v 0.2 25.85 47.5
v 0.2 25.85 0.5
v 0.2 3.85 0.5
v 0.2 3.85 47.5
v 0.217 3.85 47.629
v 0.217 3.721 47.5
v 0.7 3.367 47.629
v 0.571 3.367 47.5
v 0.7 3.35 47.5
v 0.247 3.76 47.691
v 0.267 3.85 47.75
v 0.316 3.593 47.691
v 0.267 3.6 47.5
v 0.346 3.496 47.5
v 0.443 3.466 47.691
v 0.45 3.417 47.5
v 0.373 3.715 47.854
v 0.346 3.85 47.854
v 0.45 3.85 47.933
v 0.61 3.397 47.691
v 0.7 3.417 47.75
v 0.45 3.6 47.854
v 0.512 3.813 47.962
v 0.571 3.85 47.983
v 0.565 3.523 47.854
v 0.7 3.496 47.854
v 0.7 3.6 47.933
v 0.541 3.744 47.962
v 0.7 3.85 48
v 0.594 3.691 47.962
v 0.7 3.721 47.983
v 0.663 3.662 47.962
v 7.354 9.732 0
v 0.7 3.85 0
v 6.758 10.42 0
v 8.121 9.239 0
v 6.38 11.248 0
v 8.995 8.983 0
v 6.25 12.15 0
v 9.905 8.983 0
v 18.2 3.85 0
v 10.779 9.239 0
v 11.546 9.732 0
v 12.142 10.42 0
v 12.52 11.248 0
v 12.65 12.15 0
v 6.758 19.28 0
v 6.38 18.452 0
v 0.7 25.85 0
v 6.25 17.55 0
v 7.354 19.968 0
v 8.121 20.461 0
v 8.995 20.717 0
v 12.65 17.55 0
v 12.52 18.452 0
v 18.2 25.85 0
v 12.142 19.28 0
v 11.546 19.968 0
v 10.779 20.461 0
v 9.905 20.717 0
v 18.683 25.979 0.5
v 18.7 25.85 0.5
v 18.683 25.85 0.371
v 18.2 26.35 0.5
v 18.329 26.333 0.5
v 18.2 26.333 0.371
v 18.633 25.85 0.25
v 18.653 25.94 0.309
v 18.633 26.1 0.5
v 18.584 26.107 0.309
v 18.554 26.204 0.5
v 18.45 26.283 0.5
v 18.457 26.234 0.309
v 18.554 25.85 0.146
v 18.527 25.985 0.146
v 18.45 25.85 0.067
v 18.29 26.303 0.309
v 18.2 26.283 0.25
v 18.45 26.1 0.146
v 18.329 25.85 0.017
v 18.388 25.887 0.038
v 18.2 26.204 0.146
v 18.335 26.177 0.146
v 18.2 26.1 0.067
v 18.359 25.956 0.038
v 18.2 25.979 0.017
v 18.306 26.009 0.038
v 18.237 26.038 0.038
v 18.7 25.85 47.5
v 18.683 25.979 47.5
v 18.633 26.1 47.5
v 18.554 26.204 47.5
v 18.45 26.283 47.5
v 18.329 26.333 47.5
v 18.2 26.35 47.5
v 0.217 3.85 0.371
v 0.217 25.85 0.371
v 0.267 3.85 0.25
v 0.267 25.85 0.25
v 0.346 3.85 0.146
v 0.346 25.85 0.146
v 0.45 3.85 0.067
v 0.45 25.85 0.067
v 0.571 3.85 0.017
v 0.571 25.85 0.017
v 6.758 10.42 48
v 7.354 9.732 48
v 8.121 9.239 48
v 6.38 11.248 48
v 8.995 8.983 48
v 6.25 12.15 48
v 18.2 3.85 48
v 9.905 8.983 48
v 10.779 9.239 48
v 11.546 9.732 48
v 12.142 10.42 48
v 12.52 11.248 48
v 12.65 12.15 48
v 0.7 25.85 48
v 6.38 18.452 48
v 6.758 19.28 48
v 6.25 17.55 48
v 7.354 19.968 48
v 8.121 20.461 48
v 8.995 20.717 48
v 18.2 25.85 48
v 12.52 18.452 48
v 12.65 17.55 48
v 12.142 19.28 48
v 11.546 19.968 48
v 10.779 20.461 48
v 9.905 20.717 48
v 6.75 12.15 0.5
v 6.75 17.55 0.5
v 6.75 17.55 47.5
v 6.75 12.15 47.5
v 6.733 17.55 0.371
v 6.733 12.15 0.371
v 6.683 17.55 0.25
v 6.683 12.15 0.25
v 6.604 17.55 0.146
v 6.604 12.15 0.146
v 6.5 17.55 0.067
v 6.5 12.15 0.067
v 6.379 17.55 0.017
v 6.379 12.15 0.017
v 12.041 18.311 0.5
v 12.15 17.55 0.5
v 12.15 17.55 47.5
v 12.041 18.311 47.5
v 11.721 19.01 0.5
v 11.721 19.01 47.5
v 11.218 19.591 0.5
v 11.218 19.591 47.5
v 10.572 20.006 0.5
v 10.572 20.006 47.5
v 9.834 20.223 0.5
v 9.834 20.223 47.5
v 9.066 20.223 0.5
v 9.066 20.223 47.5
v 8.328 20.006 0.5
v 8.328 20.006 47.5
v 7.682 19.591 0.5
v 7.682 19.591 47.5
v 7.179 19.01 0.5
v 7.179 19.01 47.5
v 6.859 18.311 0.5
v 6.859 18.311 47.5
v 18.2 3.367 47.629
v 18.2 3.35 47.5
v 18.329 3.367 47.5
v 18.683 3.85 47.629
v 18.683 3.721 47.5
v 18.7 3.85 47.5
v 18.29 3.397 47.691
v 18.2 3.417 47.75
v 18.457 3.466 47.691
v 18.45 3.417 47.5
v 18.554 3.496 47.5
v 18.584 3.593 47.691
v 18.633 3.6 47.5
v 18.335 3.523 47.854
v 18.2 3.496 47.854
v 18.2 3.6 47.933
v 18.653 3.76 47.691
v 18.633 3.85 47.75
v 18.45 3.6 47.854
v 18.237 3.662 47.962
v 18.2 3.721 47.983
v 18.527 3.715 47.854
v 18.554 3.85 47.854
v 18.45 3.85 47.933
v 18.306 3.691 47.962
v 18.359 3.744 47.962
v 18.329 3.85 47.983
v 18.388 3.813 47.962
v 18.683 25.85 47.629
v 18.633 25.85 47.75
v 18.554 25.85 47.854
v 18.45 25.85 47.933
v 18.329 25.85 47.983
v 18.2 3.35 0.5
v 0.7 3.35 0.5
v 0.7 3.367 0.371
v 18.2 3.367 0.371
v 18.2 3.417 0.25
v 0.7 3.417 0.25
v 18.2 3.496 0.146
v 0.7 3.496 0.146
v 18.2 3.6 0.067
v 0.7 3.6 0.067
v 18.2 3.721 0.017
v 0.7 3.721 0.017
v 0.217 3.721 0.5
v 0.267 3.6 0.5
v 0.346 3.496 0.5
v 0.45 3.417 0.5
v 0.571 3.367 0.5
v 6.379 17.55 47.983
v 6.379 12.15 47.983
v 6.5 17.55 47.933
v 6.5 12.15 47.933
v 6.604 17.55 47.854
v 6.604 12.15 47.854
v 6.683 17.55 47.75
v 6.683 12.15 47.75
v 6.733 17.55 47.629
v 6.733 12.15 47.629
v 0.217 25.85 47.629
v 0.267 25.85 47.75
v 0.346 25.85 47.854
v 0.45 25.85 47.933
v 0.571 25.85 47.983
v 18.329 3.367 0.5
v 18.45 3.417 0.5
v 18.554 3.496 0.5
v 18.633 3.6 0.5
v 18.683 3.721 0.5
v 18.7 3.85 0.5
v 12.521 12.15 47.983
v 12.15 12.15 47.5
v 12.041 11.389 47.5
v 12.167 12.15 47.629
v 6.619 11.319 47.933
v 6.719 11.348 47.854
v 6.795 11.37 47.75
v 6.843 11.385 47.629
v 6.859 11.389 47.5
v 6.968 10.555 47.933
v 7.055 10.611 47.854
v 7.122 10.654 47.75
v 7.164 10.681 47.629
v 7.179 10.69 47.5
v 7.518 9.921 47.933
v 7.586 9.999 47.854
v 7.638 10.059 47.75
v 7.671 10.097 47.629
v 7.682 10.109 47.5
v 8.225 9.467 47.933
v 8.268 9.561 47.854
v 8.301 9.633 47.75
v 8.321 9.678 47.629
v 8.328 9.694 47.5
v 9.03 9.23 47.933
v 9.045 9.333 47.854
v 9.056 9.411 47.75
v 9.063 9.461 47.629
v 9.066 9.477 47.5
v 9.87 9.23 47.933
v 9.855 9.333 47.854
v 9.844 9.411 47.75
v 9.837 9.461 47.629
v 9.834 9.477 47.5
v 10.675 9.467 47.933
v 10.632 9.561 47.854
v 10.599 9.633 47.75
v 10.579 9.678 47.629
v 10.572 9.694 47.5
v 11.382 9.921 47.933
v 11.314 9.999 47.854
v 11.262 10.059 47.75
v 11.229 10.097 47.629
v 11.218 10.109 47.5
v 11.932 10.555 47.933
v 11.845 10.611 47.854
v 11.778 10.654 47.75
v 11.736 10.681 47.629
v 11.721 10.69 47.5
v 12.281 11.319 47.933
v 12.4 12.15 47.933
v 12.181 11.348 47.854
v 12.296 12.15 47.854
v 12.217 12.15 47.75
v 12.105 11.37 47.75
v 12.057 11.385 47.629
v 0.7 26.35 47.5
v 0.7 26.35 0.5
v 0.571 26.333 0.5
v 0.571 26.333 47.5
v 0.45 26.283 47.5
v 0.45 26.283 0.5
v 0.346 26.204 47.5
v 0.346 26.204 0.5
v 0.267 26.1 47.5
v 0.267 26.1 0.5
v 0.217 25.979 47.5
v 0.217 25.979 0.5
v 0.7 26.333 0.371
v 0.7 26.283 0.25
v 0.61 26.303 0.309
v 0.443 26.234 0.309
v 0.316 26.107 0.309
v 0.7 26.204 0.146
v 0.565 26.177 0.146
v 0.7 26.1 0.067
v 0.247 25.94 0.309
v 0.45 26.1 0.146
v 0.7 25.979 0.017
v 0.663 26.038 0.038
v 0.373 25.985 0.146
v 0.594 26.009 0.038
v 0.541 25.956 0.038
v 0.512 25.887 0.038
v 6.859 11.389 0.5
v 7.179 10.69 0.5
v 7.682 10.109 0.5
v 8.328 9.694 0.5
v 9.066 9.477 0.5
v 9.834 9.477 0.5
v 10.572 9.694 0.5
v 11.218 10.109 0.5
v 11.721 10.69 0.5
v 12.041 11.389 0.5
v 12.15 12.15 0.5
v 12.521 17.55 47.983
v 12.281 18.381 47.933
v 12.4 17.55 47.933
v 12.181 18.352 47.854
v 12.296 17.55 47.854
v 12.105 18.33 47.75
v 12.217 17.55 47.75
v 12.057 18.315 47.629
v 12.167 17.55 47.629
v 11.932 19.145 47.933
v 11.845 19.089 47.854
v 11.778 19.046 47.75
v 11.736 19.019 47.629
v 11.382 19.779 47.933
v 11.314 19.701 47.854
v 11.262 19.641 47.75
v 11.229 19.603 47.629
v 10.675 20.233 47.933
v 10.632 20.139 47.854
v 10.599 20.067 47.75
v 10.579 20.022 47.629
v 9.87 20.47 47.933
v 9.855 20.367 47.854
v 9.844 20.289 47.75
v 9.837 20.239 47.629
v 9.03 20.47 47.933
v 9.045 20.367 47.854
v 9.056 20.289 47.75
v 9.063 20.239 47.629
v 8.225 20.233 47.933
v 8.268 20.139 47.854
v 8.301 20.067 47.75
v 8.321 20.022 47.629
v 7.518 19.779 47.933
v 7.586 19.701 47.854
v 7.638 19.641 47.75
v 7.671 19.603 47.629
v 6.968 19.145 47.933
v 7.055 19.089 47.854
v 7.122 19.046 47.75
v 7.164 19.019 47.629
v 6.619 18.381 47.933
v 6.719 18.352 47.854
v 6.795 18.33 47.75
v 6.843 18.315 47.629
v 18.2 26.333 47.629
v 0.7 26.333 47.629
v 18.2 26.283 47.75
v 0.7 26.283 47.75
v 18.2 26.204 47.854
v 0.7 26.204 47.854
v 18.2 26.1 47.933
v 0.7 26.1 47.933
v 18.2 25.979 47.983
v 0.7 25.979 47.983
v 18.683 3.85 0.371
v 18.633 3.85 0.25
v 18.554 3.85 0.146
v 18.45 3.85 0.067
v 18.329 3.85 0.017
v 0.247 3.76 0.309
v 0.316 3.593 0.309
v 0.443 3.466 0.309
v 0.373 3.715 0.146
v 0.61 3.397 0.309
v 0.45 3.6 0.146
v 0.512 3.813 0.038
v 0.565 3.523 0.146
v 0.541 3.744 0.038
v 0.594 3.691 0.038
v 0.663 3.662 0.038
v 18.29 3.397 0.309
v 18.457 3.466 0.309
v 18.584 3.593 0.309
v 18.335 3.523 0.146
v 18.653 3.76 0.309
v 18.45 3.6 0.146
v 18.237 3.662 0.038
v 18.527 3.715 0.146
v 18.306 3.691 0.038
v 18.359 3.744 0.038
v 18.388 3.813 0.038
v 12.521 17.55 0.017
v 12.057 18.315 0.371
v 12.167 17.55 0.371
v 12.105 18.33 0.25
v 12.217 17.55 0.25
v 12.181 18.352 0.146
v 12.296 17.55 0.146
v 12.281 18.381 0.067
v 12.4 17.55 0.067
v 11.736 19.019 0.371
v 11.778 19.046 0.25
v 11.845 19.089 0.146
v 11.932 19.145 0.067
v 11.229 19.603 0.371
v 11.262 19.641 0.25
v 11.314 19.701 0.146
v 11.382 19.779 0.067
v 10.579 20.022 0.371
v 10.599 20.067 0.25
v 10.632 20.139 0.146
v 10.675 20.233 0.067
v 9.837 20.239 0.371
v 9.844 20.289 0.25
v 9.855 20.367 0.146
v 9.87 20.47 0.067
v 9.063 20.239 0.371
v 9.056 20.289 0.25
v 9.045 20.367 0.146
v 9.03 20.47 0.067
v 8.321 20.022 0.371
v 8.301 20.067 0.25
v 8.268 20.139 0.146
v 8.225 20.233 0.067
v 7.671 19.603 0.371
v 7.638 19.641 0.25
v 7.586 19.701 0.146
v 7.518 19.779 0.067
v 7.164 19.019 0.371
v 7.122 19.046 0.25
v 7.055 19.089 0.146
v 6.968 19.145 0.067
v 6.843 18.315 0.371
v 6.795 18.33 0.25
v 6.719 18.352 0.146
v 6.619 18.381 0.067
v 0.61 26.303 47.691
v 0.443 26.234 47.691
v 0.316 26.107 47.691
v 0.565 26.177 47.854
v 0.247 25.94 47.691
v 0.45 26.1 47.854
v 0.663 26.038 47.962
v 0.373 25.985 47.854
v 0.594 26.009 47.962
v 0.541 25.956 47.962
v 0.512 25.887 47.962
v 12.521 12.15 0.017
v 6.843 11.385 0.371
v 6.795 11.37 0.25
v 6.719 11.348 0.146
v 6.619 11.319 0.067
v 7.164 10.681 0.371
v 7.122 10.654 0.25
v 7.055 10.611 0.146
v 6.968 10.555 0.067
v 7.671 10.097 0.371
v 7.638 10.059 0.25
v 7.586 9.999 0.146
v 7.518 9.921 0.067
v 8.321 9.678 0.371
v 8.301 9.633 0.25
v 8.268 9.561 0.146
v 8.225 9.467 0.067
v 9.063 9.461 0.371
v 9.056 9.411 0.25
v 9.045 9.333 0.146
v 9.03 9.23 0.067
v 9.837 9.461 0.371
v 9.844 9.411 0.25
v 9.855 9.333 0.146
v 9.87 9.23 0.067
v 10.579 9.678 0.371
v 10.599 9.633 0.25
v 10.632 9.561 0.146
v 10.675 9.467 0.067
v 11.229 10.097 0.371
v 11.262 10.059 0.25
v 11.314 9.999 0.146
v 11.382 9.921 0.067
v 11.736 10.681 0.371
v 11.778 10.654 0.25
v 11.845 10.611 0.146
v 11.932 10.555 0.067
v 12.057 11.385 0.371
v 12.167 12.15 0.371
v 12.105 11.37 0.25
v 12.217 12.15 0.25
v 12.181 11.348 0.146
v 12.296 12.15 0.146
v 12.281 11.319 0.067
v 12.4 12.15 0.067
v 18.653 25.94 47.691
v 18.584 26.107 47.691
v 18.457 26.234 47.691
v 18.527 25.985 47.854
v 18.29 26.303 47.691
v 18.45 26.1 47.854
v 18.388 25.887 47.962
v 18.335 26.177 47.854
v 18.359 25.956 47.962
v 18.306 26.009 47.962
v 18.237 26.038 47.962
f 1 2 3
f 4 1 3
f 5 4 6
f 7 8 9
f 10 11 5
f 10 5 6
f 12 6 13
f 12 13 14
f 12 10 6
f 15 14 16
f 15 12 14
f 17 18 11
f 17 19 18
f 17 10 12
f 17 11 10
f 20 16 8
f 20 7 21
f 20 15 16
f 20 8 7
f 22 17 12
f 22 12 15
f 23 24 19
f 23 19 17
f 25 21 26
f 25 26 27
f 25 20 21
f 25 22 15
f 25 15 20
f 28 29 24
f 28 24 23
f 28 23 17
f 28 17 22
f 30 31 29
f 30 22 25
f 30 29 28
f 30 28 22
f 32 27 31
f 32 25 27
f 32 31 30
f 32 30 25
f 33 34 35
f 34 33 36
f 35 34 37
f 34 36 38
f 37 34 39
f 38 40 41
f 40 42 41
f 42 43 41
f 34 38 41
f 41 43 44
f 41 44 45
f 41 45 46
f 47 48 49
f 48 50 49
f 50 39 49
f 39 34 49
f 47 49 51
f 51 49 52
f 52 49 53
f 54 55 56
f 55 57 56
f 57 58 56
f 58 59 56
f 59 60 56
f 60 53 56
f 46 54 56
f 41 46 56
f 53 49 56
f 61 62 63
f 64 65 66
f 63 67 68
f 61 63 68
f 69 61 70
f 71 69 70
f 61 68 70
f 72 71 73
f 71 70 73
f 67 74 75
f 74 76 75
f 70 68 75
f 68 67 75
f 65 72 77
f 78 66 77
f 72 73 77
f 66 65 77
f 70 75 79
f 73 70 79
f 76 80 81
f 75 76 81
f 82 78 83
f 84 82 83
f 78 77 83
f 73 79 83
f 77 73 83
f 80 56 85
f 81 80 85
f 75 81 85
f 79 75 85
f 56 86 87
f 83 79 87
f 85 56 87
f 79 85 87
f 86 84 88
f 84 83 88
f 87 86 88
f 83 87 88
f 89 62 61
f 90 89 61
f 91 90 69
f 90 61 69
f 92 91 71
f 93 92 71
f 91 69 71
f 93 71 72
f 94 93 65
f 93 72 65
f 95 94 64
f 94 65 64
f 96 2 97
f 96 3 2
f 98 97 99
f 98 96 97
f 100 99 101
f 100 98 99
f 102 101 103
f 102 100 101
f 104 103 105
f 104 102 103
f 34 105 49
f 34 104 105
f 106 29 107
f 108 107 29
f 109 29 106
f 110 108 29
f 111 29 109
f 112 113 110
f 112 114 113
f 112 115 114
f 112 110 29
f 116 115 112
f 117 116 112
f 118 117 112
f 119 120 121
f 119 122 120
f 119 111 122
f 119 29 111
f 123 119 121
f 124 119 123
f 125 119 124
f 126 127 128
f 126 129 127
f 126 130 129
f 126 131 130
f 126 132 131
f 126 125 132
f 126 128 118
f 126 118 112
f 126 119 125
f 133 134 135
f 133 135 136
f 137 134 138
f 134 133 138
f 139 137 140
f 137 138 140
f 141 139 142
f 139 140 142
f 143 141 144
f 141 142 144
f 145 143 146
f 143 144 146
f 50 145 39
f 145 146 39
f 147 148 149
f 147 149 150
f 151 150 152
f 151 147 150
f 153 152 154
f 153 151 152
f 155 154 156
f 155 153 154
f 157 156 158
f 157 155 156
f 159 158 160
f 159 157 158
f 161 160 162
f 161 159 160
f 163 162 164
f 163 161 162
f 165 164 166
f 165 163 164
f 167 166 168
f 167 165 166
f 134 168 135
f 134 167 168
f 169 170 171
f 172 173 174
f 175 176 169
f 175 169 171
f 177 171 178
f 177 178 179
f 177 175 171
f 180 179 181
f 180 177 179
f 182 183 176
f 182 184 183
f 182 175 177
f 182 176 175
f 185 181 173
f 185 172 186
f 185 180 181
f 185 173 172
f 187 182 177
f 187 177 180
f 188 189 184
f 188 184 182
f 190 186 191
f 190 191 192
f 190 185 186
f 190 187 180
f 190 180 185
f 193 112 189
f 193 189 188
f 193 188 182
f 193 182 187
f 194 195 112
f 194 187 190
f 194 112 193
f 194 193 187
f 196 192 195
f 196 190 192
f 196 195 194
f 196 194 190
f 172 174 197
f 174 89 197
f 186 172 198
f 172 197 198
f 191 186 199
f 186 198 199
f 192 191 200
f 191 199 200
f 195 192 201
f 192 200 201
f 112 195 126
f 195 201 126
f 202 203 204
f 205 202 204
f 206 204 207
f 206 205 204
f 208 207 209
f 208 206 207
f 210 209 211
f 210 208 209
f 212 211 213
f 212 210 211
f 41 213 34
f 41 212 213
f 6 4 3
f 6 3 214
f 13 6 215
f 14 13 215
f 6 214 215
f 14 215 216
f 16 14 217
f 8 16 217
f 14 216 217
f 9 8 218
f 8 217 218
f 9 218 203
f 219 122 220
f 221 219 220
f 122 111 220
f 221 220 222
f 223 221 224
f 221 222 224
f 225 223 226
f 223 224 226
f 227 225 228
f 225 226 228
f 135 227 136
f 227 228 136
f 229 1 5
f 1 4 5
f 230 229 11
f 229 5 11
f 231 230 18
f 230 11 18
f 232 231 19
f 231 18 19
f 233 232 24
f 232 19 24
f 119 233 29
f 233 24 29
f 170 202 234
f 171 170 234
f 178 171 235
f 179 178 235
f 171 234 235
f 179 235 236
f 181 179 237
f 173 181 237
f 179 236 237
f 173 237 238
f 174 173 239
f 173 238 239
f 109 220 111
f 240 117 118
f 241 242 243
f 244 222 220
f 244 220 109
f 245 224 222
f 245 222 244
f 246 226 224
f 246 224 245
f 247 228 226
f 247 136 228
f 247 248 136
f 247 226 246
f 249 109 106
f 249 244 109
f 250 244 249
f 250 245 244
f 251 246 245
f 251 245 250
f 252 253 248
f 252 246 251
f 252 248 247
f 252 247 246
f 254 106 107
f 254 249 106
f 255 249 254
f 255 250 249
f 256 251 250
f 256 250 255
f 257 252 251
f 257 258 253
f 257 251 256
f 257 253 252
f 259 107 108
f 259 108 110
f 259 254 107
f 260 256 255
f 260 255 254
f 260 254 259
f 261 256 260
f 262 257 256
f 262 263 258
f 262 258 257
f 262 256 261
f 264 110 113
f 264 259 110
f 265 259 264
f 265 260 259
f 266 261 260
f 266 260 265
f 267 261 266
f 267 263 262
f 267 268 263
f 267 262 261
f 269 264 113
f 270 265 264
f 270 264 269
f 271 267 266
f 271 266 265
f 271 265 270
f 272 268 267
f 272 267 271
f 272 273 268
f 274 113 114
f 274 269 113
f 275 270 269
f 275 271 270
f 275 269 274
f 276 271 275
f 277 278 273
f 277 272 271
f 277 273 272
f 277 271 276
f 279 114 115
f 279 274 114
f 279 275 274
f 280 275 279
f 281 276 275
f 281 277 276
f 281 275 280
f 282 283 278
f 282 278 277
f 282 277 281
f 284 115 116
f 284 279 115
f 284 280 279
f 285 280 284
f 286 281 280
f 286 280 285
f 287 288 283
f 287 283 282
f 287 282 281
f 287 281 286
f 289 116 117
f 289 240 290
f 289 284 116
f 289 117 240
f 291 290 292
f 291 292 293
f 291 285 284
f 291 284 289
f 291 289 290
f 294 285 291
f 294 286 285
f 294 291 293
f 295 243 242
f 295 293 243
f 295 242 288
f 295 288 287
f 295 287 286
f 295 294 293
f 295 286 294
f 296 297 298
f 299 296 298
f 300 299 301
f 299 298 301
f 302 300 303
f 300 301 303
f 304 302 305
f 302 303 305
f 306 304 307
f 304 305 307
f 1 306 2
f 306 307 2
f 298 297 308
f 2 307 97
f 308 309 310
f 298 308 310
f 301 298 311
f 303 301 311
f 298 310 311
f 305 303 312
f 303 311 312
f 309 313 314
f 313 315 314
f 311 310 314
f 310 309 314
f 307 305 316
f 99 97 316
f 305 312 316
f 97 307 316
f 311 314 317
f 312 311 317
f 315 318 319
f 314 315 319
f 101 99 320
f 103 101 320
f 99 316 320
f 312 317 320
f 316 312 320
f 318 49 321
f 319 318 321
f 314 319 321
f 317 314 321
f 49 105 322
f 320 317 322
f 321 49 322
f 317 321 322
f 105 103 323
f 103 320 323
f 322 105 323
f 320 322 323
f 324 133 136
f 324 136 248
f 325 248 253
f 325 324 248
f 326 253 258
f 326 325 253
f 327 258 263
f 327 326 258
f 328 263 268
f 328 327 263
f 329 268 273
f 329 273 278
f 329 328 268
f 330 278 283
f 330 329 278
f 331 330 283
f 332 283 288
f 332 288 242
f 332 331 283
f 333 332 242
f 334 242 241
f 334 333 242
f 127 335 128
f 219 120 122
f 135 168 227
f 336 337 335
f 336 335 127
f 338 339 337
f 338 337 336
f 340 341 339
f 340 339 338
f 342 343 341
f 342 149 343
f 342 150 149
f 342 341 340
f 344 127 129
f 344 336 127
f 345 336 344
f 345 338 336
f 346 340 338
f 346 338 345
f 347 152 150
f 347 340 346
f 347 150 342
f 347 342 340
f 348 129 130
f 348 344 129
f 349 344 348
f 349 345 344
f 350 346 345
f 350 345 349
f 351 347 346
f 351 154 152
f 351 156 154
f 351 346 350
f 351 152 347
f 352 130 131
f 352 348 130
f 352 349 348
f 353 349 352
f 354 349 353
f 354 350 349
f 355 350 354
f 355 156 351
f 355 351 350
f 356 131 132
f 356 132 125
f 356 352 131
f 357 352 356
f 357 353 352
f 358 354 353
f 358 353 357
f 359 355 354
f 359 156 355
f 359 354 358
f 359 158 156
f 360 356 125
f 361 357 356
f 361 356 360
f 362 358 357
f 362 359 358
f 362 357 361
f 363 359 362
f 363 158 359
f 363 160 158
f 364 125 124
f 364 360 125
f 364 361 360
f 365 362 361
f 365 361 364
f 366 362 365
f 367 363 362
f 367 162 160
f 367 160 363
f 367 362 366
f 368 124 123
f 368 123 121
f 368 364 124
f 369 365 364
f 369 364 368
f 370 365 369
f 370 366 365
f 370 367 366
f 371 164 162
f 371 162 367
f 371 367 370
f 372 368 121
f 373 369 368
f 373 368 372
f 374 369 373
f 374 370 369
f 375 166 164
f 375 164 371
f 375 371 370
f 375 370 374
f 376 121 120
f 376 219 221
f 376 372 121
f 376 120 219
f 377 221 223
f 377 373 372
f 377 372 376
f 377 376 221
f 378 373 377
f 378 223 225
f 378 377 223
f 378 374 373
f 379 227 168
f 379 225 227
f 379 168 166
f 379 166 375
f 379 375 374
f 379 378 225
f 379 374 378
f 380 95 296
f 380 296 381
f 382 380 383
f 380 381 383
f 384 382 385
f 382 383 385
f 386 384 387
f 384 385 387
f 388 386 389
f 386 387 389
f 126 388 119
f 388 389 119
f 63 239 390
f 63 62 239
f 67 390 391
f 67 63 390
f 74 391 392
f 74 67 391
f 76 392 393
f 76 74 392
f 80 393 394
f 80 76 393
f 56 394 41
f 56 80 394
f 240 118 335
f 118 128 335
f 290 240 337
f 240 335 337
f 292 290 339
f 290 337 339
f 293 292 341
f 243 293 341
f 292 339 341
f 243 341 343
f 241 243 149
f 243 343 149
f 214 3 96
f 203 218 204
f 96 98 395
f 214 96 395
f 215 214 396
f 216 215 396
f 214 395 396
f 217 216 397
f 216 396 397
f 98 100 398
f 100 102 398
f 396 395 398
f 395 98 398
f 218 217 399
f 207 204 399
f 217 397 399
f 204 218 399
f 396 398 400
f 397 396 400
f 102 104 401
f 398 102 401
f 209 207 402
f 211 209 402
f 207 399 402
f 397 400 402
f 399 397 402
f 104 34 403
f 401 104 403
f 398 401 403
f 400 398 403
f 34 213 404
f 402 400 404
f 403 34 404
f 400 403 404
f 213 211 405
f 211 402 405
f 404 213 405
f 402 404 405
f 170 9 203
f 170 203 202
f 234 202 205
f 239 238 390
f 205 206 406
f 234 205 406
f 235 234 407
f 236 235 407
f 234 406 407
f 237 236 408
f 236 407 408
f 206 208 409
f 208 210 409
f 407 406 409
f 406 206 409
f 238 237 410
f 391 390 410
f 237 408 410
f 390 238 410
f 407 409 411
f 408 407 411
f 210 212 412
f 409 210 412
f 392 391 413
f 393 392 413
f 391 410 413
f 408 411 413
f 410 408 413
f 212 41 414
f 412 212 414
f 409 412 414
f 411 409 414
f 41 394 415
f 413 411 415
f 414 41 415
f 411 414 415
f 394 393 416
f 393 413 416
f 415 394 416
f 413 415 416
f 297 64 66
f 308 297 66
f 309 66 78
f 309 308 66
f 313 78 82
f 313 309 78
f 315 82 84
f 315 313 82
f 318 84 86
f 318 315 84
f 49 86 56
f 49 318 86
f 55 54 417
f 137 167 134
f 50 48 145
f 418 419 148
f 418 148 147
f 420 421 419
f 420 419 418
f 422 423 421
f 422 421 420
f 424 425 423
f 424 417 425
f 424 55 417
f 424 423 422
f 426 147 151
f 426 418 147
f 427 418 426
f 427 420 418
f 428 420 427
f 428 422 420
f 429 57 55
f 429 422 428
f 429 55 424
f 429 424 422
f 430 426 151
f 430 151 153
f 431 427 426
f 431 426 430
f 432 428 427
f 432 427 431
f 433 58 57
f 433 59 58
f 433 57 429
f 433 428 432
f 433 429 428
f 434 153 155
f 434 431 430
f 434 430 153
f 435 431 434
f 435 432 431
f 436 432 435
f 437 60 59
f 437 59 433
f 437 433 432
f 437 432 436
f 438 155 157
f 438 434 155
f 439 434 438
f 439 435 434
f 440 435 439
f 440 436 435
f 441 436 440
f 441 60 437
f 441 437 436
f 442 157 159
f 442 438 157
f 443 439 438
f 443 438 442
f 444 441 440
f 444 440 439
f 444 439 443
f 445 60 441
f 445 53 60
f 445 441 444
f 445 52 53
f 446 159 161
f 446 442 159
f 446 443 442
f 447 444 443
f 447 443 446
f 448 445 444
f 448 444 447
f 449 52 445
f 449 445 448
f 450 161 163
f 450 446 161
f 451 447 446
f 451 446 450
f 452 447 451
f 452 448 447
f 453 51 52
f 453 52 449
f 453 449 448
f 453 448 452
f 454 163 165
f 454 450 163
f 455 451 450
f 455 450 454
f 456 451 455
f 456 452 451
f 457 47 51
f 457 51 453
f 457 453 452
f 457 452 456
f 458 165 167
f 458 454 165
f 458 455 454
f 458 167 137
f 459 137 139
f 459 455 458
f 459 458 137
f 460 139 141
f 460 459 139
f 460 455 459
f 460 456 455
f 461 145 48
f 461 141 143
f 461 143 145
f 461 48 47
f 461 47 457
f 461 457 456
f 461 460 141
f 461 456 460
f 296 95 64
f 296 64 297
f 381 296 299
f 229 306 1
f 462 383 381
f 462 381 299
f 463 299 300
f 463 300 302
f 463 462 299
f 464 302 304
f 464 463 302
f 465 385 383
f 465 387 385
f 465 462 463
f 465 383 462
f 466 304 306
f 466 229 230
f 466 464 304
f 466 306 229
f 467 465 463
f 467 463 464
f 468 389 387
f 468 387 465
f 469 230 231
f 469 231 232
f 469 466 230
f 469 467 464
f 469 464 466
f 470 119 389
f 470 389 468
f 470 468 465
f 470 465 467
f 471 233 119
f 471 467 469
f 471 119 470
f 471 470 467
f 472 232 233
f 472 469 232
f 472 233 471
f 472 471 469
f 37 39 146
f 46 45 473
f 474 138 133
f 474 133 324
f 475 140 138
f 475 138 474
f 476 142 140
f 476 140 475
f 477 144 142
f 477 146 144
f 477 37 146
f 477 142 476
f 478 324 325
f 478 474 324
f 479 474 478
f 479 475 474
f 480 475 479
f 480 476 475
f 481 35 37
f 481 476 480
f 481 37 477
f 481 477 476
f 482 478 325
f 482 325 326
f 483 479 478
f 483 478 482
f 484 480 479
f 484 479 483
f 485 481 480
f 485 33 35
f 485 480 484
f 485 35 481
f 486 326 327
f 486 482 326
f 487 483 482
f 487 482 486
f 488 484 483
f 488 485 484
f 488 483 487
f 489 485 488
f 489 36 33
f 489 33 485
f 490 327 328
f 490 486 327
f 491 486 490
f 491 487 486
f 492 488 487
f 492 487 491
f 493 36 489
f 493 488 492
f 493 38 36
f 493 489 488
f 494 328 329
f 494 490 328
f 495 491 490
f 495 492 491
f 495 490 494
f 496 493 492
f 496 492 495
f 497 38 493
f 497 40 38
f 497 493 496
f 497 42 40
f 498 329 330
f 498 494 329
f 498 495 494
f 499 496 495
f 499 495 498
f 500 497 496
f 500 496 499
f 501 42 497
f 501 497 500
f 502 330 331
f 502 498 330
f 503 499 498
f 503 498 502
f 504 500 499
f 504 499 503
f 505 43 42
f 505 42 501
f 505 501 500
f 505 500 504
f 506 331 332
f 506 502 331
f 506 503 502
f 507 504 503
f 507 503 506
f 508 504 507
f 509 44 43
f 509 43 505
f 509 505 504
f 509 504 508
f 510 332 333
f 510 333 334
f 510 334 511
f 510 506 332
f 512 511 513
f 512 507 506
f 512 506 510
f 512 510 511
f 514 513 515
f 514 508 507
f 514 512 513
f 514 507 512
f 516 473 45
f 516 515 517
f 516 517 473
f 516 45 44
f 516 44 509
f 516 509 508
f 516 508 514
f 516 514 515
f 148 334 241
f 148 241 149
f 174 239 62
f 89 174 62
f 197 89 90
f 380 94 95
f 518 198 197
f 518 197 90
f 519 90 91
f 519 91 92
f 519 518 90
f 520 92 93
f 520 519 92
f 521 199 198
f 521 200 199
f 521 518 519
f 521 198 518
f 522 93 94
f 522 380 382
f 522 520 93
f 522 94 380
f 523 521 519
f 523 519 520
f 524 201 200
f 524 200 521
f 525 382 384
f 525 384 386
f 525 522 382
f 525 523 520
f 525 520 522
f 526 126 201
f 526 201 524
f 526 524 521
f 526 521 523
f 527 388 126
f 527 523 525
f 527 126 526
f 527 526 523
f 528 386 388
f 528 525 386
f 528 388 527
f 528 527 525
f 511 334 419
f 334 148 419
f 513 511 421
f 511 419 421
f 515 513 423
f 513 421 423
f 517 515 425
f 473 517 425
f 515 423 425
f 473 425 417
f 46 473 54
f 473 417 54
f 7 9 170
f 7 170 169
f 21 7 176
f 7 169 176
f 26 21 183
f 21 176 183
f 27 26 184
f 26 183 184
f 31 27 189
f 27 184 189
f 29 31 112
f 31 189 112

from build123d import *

# Parameters (mm, degrees)
EXTRUDE_1_DEPTH = 48
FILLET_1_R      = 0.5
FILLET_2_R      = 0.5


with BuildPart() as part:
    # Эскиз1 → Бобышка-Вытянуть1 (new body)
    with BuildSketch(Plane.XY):
        with BuildLine():
            Line((0.7, 3.35), (18.2, 3.35))
            ThreePointArc((18.2, 3.35), (18.553553391, 3.496446609), (18.7, 3.85))
            Line((18.7, 3.85), (18.7, 25.85))
            ThreePointArc((18.7, 25.85), (18.553553391, 26.203553391), (18.2, 26.35))
            Line((18.2, 26.35), (0.7, 26.35))
            ThreePointArc((0.7, 26.35), (0.346446609, 26.203553391), (0.2, 25.85))
            Line((0.2, 25.85), (0.2, 3.85))
            ThreePointArc((0.2, 3.85), (0.346446609, 3.496446609), (0.7, 3.35))
        make_face()
        with BuildLine():
            Line((6.75, 17.55), (6.75, 12.15))
            ThreePointArc((6.75, 12.15), (9.45, 9.45), (12.15, 12.15))
            Line((12.15, 12.15), (12.15, 17.55))
            ThreePointArc((12.15, 17.55), (9.45, 20.25), (6.75, 17.55))
        make_face(mode=Mode.SUBTRACT)
    extrude(amount=EXTRUDE_1_DEPTH)

    # Скругление1
    fillet_1_edges = [part.edges().sort_by_distance(p)[0] for p in [
        (9.45, 3.35, 0),
        (0.346446609, 3.496446609, 0),
        (0.2, 14.85, 0),
        (0.346446609, 26.203553391, 0),
        (9.45, 20.25, 0),
        (6.75, 14.85, 0),
        (9.45, 9.45, 0),
        (12.15, 14.85, 0),
        (9.45, 26.35, 0),
        (18.553553391, 26.203553391, 0),
        (18.7, 14.85, 0),
        (18.553553391, 3.496446609, 0),
    ]]
    fillet(fillet_1_edges, radius=FILLET_1_R)

    # Скругление2
    fillet_2_edges = [part.edges().sort_by_distance(p)[0] for p in [
        (0.346446609, 3.496446609, 48),
        (9.45, 3.35, 48),
        (18.553553391, 3.496446609, 48),
        (18.7, 14.85, 48),
        (9.45, 20.25, 48),
        (6.75, 14.85, 48),
        (9.45, 9.45, 48),
        (12.15, 14.85, 48),
        (18.553553391, 26.203553391, 48),
        (9.45, 26.35, 48),
        (0.346446609, 26.203553391, 48),
        (0.2, 14.85, 48),
    ]]
    fillet(fillet_2_edges, radius=FILLET_2_R)


solid = part.part
